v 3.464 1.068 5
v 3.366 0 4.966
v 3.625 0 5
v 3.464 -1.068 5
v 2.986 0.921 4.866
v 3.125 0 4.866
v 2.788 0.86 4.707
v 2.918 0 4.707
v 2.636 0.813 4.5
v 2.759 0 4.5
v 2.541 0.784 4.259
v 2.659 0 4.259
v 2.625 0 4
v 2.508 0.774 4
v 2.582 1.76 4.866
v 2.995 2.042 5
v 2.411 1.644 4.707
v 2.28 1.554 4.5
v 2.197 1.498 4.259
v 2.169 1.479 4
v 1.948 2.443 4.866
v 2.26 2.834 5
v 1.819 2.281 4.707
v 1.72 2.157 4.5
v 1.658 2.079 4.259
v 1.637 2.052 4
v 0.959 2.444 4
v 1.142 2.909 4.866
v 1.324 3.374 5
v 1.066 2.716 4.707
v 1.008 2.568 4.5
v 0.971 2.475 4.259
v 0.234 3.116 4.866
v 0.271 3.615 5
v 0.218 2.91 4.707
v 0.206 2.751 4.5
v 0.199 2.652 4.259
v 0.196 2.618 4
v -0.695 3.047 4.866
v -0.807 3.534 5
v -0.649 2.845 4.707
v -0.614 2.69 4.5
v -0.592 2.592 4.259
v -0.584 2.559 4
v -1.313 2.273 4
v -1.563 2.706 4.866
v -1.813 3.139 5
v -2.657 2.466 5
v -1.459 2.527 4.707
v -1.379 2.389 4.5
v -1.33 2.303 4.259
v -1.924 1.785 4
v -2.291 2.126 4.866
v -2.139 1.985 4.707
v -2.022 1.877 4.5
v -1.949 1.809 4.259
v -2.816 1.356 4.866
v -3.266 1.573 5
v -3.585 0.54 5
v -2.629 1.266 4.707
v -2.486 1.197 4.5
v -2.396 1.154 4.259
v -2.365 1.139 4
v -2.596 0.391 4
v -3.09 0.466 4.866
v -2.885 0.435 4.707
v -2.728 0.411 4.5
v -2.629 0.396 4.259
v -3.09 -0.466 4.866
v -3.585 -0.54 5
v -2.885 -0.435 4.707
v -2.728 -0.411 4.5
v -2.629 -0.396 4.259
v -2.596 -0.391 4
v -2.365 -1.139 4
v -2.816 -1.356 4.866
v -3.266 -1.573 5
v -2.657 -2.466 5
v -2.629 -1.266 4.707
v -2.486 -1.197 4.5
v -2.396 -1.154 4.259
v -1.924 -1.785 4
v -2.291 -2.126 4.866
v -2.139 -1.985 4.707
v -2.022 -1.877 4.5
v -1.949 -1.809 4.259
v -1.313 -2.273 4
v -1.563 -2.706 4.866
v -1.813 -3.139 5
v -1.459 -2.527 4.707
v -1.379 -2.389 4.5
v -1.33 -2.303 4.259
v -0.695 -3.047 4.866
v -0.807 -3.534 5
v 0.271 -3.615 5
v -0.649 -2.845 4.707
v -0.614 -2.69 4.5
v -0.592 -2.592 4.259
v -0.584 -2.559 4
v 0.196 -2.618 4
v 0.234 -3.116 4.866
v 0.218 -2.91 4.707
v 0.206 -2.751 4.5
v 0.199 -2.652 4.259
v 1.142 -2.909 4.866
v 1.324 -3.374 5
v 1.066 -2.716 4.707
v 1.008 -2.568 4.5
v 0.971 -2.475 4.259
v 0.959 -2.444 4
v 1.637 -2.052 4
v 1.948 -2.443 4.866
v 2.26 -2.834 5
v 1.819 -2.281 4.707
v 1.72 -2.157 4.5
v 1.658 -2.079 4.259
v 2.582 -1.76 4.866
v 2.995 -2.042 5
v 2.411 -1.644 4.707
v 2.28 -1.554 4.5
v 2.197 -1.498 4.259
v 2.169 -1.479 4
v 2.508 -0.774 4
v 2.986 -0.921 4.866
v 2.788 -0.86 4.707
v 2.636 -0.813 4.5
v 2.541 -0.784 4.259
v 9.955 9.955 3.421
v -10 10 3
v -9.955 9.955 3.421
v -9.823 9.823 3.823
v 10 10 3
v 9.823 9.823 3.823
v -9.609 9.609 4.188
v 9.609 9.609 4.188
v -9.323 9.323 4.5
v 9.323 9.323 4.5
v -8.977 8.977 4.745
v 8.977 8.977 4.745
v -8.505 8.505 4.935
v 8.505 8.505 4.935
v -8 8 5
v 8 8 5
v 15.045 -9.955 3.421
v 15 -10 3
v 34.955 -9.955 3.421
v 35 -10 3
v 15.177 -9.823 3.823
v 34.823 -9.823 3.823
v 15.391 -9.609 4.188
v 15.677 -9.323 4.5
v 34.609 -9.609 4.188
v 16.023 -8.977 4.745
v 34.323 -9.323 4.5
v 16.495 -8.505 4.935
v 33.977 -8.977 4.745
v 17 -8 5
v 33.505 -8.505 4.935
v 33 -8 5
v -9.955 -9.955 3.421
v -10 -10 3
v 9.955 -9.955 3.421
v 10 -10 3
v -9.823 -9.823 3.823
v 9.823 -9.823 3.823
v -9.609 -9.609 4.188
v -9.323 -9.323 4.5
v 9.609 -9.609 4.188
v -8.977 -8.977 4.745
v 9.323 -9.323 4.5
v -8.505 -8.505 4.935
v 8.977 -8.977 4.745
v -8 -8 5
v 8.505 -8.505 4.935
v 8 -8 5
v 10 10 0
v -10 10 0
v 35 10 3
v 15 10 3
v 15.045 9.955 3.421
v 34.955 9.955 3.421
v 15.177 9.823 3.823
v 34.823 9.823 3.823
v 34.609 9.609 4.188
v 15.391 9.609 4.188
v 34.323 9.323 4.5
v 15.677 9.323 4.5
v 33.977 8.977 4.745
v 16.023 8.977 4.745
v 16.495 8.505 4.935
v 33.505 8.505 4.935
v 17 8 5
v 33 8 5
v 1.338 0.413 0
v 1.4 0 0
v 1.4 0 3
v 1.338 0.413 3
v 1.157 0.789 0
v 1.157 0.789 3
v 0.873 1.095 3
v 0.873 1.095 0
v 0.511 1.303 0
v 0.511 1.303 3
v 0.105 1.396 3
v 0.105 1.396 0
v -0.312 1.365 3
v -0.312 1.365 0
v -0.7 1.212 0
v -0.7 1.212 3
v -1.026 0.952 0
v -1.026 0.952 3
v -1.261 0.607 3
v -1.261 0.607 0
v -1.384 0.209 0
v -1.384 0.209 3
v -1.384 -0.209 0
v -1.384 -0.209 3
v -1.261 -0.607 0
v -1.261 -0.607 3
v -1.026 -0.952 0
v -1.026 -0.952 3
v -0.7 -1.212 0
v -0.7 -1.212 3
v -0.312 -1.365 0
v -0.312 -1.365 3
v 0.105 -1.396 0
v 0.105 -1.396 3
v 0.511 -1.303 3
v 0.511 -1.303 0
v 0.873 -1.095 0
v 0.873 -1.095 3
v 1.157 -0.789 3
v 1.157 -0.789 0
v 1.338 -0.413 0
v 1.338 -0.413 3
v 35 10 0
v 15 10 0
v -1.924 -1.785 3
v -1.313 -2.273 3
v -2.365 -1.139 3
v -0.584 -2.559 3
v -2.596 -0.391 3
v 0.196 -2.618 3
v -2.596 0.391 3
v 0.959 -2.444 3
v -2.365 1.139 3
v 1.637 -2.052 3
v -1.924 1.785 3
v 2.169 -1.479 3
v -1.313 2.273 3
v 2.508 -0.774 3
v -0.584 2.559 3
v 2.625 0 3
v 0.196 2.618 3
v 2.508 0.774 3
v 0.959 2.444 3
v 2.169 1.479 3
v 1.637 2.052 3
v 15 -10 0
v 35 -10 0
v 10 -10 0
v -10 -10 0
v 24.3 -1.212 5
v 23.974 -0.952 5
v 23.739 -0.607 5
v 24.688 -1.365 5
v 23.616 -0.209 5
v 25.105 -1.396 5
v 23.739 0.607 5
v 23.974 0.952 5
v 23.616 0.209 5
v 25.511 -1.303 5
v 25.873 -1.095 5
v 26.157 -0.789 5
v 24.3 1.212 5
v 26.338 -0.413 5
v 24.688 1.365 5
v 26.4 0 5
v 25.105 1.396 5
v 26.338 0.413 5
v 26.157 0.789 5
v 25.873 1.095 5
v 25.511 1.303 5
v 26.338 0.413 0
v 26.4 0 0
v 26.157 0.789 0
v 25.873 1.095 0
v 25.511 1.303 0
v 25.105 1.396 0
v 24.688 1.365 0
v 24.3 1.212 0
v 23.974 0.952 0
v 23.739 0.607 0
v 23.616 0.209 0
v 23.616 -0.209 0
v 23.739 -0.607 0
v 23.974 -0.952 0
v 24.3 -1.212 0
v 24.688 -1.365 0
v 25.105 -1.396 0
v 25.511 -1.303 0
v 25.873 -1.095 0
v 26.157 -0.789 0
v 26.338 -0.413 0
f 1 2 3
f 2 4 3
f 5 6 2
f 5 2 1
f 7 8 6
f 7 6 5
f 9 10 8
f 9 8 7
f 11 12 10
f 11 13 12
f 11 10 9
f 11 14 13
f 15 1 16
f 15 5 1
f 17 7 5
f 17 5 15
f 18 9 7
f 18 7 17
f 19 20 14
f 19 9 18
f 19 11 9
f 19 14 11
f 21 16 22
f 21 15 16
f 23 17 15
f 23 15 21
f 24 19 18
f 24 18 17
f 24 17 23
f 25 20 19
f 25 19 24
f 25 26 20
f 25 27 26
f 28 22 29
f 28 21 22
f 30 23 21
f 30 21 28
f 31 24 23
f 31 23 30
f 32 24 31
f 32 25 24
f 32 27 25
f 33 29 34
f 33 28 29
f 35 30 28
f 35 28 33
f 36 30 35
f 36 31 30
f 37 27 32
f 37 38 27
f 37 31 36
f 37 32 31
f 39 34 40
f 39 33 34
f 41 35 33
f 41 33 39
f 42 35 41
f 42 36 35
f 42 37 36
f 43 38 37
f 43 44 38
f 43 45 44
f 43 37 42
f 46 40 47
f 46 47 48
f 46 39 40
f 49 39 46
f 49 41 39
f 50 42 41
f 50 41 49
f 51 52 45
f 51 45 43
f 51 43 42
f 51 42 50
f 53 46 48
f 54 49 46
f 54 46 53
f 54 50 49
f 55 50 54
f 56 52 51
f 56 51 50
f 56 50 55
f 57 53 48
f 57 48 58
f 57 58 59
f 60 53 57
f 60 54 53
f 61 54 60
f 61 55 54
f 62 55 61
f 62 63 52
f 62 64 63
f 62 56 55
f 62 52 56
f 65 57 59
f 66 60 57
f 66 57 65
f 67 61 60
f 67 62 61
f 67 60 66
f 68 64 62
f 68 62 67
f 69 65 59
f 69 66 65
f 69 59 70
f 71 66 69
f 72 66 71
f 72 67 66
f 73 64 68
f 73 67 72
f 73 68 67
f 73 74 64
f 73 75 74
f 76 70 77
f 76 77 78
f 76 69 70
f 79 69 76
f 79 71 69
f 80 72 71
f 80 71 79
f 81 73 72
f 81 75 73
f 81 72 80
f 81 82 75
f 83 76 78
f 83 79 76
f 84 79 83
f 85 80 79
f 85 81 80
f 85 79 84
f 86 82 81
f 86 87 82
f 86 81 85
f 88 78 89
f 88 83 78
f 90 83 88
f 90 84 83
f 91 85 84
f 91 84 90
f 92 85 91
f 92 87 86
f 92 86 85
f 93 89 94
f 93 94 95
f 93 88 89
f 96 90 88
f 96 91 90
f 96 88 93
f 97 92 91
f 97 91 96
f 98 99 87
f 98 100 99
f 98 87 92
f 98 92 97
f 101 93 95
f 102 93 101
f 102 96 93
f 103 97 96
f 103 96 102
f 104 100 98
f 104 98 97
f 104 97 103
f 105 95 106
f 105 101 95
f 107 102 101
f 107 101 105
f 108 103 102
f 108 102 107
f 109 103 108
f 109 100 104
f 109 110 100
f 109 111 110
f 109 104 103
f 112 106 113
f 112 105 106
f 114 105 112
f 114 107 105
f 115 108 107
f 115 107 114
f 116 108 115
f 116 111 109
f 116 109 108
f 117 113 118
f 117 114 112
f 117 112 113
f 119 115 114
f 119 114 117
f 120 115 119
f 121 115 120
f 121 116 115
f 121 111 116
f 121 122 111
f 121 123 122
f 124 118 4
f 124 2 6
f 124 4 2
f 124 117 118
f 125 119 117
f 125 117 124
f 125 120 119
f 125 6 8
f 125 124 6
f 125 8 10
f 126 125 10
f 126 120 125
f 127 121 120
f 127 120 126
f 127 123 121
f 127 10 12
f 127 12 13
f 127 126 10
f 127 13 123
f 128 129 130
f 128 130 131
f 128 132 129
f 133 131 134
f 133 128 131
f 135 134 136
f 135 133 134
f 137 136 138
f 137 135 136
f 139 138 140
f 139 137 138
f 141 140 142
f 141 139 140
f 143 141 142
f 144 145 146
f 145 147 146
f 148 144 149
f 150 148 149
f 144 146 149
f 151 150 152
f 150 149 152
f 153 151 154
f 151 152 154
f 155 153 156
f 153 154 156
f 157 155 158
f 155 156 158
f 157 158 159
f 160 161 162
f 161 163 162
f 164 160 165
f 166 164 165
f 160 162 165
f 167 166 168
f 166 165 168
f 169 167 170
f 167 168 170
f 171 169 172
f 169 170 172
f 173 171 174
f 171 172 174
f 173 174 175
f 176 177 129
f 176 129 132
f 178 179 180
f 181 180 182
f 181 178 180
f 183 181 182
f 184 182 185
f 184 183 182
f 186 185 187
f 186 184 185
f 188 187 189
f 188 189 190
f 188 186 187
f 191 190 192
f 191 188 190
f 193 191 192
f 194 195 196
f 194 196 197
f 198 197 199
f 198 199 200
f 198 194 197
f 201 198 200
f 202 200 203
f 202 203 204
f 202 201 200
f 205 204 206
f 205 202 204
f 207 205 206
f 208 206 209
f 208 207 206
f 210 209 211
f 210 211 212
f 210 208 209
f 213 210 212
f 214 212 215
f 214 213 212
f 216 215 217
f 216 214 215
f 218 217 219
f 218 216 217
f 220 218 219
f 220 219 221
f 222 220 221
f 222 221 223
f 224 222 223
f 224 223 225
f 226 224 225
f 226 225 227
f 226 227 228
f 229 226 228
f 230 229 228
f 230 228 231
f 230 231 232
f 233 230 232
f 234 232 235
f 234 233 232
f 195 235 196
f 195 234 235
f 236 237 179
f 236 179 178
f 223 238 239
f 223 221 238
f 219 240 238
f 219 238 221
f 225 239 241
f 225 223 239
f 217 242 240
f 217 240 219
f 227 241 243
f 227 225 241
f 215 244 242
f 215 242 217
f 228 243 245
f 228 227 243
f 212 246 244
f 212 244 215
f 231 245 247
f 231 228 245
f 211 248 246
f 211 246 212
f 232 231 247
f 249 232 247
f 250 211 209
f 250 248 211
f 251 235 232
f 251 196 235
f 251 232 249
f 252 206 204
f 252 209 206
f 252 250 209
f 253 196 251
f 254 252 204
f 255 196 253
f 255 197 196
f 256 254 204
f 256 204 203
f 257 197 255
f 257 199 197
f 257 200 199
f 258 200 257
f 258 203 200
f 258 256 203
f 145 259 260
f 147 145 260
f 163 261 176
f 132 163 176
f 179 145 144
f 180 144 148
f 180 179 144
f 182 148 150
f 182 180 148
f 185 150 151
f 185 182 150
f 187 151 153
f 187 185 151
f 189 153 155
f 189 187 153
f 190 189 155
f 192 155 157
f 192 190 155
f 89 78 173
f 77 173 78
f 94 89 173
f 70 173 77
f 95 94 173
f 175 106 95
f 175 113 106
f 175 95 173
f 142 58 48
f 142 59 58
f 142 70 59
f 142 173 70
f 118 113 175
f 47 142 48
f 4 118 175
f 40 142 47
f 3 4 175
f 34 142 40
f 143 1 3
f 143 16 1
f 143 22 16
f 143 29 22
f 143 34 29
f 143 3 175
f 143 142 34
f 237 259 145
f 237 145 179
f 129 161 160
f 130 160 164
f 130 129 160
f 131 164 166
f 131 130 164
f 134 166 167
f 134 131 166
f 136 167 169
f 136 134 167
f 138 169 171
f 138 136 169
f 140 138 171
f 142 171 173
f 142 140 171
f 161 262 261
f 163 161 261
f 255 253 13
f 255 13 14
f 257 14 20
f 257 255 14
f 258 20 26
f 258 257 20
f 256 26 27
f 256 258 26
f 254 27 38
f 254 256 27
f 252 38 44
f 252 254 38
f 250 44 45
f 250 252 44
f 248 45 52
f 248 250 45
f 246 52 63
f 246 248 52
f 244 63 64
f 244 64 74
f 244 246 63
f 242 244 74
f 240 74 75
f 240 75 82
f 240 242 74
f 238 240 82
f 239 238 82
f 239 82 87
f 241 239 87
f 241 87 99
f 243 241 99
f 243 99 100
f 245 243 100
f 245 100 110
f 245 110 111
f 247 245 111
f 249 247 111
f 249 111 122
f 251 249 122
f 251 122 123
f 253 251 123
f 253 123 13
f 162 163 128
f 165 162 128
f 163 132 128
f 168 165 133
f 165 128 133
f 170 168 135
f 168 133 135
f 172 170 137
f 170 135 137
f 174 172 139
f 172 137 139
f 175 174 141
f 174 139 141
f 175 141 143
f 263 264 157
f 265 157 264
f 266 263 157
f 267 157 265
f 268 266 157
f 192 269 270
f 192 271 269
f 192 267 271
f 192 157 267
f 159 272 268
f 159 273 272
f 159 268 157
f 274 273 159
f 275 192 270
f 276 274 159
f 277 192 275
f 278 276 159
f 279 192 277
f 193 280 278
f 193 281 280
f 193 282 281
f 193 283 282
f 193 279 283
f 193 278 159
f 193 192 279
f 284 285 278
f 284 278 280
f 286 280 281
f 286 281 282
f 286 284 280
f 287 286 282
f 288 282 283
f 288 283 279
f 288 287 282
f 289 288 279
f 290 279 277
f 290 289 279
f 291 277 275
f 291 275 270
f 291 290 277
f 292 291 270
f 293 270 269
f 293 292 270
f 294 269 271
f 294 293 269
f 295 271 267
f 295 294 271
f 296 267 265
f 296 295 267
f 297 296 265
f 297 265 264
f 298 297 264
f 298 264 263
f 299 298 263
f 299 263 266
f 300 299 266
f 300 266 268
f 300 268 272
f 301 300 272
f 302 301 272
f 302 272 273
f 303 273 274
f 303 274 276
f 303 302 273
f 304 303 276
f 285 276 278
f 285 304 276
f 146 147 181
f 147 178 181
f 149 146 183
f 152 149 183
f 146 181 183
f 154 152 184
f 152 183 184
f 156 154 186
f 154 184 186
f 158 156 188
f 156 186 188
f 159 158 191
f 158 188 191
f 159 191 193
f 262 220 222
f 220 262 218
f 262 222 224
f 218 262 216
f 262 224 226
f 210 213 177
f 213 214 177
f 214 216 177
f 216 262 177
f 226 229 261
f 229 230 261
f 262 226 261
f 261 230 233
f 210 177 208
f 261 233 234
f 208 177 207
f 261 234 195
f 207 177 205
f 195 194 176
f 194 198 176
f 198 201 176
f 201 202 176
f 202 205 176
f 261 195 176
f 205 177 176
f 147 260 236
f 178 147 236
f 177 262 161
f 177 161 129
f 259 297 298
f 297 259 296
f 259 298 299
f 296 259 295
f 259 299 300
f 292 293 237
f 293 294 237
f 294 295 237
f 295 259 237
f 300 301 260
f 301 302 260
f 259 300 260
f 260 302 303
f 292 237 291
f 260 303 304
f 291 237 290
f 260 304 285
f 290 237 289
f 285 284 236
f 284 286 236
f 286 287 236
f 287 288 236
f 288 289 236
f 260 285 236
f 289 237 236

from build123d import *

# Parameters (mm, degrees)
F0_W     = 20
F0_H     = 20
F0_R     = 2.625
F0_R_2   = 1.4
F1_DEPTH = 5
F2_DEPTH = 3
F3_R     = 2
F4_R     = 1


with BuildPart() as f1:
    # F0 (on Top) → F1 (new body)
    with BuildSketch(Plane.XY):
        Rectangle(F0_W, F0_H)
        Circle(F0_R, mode=Mode.SUBTRACT)
        with Locations((25, 0)):
            Rectangle(F0_W, F0_H)
        with Locations((25, 0)):
            Circle(F0_R_2, mode=Mode.SUBTRACT)
    extrude(amount=F1_DEPTH)

    # F0 (on Top) → F2 (join)
    with BuildSketch(Plane.XY):
        Circle(F0_R)
        Circle(F0_R_2, mode=Mode.SUBTRACT)
    extrude(amount=F2_DEPTH)

    # F3
    f3_edges = [f1.edges().sort_by_distance(p)[0] for p in [
        (10, 0, 5),
        (0, -10, 5),
        (0, 10, 5),
        (-10, 0, 5),
        (25, -10, 5),
        (15, 0, 5),
        (25, 10, 5),
        (35, 0, 5),
    ]]
    fillet(f3_edges, radius=F3_R)

    # F4
    f4_edges = [f1.edges().sort_by_distance(p)[0] for p in [
        (-2.625, 0, 5),
    ]]
    fillet(f4_edges, radius=F4_R)


solid = f1.part
